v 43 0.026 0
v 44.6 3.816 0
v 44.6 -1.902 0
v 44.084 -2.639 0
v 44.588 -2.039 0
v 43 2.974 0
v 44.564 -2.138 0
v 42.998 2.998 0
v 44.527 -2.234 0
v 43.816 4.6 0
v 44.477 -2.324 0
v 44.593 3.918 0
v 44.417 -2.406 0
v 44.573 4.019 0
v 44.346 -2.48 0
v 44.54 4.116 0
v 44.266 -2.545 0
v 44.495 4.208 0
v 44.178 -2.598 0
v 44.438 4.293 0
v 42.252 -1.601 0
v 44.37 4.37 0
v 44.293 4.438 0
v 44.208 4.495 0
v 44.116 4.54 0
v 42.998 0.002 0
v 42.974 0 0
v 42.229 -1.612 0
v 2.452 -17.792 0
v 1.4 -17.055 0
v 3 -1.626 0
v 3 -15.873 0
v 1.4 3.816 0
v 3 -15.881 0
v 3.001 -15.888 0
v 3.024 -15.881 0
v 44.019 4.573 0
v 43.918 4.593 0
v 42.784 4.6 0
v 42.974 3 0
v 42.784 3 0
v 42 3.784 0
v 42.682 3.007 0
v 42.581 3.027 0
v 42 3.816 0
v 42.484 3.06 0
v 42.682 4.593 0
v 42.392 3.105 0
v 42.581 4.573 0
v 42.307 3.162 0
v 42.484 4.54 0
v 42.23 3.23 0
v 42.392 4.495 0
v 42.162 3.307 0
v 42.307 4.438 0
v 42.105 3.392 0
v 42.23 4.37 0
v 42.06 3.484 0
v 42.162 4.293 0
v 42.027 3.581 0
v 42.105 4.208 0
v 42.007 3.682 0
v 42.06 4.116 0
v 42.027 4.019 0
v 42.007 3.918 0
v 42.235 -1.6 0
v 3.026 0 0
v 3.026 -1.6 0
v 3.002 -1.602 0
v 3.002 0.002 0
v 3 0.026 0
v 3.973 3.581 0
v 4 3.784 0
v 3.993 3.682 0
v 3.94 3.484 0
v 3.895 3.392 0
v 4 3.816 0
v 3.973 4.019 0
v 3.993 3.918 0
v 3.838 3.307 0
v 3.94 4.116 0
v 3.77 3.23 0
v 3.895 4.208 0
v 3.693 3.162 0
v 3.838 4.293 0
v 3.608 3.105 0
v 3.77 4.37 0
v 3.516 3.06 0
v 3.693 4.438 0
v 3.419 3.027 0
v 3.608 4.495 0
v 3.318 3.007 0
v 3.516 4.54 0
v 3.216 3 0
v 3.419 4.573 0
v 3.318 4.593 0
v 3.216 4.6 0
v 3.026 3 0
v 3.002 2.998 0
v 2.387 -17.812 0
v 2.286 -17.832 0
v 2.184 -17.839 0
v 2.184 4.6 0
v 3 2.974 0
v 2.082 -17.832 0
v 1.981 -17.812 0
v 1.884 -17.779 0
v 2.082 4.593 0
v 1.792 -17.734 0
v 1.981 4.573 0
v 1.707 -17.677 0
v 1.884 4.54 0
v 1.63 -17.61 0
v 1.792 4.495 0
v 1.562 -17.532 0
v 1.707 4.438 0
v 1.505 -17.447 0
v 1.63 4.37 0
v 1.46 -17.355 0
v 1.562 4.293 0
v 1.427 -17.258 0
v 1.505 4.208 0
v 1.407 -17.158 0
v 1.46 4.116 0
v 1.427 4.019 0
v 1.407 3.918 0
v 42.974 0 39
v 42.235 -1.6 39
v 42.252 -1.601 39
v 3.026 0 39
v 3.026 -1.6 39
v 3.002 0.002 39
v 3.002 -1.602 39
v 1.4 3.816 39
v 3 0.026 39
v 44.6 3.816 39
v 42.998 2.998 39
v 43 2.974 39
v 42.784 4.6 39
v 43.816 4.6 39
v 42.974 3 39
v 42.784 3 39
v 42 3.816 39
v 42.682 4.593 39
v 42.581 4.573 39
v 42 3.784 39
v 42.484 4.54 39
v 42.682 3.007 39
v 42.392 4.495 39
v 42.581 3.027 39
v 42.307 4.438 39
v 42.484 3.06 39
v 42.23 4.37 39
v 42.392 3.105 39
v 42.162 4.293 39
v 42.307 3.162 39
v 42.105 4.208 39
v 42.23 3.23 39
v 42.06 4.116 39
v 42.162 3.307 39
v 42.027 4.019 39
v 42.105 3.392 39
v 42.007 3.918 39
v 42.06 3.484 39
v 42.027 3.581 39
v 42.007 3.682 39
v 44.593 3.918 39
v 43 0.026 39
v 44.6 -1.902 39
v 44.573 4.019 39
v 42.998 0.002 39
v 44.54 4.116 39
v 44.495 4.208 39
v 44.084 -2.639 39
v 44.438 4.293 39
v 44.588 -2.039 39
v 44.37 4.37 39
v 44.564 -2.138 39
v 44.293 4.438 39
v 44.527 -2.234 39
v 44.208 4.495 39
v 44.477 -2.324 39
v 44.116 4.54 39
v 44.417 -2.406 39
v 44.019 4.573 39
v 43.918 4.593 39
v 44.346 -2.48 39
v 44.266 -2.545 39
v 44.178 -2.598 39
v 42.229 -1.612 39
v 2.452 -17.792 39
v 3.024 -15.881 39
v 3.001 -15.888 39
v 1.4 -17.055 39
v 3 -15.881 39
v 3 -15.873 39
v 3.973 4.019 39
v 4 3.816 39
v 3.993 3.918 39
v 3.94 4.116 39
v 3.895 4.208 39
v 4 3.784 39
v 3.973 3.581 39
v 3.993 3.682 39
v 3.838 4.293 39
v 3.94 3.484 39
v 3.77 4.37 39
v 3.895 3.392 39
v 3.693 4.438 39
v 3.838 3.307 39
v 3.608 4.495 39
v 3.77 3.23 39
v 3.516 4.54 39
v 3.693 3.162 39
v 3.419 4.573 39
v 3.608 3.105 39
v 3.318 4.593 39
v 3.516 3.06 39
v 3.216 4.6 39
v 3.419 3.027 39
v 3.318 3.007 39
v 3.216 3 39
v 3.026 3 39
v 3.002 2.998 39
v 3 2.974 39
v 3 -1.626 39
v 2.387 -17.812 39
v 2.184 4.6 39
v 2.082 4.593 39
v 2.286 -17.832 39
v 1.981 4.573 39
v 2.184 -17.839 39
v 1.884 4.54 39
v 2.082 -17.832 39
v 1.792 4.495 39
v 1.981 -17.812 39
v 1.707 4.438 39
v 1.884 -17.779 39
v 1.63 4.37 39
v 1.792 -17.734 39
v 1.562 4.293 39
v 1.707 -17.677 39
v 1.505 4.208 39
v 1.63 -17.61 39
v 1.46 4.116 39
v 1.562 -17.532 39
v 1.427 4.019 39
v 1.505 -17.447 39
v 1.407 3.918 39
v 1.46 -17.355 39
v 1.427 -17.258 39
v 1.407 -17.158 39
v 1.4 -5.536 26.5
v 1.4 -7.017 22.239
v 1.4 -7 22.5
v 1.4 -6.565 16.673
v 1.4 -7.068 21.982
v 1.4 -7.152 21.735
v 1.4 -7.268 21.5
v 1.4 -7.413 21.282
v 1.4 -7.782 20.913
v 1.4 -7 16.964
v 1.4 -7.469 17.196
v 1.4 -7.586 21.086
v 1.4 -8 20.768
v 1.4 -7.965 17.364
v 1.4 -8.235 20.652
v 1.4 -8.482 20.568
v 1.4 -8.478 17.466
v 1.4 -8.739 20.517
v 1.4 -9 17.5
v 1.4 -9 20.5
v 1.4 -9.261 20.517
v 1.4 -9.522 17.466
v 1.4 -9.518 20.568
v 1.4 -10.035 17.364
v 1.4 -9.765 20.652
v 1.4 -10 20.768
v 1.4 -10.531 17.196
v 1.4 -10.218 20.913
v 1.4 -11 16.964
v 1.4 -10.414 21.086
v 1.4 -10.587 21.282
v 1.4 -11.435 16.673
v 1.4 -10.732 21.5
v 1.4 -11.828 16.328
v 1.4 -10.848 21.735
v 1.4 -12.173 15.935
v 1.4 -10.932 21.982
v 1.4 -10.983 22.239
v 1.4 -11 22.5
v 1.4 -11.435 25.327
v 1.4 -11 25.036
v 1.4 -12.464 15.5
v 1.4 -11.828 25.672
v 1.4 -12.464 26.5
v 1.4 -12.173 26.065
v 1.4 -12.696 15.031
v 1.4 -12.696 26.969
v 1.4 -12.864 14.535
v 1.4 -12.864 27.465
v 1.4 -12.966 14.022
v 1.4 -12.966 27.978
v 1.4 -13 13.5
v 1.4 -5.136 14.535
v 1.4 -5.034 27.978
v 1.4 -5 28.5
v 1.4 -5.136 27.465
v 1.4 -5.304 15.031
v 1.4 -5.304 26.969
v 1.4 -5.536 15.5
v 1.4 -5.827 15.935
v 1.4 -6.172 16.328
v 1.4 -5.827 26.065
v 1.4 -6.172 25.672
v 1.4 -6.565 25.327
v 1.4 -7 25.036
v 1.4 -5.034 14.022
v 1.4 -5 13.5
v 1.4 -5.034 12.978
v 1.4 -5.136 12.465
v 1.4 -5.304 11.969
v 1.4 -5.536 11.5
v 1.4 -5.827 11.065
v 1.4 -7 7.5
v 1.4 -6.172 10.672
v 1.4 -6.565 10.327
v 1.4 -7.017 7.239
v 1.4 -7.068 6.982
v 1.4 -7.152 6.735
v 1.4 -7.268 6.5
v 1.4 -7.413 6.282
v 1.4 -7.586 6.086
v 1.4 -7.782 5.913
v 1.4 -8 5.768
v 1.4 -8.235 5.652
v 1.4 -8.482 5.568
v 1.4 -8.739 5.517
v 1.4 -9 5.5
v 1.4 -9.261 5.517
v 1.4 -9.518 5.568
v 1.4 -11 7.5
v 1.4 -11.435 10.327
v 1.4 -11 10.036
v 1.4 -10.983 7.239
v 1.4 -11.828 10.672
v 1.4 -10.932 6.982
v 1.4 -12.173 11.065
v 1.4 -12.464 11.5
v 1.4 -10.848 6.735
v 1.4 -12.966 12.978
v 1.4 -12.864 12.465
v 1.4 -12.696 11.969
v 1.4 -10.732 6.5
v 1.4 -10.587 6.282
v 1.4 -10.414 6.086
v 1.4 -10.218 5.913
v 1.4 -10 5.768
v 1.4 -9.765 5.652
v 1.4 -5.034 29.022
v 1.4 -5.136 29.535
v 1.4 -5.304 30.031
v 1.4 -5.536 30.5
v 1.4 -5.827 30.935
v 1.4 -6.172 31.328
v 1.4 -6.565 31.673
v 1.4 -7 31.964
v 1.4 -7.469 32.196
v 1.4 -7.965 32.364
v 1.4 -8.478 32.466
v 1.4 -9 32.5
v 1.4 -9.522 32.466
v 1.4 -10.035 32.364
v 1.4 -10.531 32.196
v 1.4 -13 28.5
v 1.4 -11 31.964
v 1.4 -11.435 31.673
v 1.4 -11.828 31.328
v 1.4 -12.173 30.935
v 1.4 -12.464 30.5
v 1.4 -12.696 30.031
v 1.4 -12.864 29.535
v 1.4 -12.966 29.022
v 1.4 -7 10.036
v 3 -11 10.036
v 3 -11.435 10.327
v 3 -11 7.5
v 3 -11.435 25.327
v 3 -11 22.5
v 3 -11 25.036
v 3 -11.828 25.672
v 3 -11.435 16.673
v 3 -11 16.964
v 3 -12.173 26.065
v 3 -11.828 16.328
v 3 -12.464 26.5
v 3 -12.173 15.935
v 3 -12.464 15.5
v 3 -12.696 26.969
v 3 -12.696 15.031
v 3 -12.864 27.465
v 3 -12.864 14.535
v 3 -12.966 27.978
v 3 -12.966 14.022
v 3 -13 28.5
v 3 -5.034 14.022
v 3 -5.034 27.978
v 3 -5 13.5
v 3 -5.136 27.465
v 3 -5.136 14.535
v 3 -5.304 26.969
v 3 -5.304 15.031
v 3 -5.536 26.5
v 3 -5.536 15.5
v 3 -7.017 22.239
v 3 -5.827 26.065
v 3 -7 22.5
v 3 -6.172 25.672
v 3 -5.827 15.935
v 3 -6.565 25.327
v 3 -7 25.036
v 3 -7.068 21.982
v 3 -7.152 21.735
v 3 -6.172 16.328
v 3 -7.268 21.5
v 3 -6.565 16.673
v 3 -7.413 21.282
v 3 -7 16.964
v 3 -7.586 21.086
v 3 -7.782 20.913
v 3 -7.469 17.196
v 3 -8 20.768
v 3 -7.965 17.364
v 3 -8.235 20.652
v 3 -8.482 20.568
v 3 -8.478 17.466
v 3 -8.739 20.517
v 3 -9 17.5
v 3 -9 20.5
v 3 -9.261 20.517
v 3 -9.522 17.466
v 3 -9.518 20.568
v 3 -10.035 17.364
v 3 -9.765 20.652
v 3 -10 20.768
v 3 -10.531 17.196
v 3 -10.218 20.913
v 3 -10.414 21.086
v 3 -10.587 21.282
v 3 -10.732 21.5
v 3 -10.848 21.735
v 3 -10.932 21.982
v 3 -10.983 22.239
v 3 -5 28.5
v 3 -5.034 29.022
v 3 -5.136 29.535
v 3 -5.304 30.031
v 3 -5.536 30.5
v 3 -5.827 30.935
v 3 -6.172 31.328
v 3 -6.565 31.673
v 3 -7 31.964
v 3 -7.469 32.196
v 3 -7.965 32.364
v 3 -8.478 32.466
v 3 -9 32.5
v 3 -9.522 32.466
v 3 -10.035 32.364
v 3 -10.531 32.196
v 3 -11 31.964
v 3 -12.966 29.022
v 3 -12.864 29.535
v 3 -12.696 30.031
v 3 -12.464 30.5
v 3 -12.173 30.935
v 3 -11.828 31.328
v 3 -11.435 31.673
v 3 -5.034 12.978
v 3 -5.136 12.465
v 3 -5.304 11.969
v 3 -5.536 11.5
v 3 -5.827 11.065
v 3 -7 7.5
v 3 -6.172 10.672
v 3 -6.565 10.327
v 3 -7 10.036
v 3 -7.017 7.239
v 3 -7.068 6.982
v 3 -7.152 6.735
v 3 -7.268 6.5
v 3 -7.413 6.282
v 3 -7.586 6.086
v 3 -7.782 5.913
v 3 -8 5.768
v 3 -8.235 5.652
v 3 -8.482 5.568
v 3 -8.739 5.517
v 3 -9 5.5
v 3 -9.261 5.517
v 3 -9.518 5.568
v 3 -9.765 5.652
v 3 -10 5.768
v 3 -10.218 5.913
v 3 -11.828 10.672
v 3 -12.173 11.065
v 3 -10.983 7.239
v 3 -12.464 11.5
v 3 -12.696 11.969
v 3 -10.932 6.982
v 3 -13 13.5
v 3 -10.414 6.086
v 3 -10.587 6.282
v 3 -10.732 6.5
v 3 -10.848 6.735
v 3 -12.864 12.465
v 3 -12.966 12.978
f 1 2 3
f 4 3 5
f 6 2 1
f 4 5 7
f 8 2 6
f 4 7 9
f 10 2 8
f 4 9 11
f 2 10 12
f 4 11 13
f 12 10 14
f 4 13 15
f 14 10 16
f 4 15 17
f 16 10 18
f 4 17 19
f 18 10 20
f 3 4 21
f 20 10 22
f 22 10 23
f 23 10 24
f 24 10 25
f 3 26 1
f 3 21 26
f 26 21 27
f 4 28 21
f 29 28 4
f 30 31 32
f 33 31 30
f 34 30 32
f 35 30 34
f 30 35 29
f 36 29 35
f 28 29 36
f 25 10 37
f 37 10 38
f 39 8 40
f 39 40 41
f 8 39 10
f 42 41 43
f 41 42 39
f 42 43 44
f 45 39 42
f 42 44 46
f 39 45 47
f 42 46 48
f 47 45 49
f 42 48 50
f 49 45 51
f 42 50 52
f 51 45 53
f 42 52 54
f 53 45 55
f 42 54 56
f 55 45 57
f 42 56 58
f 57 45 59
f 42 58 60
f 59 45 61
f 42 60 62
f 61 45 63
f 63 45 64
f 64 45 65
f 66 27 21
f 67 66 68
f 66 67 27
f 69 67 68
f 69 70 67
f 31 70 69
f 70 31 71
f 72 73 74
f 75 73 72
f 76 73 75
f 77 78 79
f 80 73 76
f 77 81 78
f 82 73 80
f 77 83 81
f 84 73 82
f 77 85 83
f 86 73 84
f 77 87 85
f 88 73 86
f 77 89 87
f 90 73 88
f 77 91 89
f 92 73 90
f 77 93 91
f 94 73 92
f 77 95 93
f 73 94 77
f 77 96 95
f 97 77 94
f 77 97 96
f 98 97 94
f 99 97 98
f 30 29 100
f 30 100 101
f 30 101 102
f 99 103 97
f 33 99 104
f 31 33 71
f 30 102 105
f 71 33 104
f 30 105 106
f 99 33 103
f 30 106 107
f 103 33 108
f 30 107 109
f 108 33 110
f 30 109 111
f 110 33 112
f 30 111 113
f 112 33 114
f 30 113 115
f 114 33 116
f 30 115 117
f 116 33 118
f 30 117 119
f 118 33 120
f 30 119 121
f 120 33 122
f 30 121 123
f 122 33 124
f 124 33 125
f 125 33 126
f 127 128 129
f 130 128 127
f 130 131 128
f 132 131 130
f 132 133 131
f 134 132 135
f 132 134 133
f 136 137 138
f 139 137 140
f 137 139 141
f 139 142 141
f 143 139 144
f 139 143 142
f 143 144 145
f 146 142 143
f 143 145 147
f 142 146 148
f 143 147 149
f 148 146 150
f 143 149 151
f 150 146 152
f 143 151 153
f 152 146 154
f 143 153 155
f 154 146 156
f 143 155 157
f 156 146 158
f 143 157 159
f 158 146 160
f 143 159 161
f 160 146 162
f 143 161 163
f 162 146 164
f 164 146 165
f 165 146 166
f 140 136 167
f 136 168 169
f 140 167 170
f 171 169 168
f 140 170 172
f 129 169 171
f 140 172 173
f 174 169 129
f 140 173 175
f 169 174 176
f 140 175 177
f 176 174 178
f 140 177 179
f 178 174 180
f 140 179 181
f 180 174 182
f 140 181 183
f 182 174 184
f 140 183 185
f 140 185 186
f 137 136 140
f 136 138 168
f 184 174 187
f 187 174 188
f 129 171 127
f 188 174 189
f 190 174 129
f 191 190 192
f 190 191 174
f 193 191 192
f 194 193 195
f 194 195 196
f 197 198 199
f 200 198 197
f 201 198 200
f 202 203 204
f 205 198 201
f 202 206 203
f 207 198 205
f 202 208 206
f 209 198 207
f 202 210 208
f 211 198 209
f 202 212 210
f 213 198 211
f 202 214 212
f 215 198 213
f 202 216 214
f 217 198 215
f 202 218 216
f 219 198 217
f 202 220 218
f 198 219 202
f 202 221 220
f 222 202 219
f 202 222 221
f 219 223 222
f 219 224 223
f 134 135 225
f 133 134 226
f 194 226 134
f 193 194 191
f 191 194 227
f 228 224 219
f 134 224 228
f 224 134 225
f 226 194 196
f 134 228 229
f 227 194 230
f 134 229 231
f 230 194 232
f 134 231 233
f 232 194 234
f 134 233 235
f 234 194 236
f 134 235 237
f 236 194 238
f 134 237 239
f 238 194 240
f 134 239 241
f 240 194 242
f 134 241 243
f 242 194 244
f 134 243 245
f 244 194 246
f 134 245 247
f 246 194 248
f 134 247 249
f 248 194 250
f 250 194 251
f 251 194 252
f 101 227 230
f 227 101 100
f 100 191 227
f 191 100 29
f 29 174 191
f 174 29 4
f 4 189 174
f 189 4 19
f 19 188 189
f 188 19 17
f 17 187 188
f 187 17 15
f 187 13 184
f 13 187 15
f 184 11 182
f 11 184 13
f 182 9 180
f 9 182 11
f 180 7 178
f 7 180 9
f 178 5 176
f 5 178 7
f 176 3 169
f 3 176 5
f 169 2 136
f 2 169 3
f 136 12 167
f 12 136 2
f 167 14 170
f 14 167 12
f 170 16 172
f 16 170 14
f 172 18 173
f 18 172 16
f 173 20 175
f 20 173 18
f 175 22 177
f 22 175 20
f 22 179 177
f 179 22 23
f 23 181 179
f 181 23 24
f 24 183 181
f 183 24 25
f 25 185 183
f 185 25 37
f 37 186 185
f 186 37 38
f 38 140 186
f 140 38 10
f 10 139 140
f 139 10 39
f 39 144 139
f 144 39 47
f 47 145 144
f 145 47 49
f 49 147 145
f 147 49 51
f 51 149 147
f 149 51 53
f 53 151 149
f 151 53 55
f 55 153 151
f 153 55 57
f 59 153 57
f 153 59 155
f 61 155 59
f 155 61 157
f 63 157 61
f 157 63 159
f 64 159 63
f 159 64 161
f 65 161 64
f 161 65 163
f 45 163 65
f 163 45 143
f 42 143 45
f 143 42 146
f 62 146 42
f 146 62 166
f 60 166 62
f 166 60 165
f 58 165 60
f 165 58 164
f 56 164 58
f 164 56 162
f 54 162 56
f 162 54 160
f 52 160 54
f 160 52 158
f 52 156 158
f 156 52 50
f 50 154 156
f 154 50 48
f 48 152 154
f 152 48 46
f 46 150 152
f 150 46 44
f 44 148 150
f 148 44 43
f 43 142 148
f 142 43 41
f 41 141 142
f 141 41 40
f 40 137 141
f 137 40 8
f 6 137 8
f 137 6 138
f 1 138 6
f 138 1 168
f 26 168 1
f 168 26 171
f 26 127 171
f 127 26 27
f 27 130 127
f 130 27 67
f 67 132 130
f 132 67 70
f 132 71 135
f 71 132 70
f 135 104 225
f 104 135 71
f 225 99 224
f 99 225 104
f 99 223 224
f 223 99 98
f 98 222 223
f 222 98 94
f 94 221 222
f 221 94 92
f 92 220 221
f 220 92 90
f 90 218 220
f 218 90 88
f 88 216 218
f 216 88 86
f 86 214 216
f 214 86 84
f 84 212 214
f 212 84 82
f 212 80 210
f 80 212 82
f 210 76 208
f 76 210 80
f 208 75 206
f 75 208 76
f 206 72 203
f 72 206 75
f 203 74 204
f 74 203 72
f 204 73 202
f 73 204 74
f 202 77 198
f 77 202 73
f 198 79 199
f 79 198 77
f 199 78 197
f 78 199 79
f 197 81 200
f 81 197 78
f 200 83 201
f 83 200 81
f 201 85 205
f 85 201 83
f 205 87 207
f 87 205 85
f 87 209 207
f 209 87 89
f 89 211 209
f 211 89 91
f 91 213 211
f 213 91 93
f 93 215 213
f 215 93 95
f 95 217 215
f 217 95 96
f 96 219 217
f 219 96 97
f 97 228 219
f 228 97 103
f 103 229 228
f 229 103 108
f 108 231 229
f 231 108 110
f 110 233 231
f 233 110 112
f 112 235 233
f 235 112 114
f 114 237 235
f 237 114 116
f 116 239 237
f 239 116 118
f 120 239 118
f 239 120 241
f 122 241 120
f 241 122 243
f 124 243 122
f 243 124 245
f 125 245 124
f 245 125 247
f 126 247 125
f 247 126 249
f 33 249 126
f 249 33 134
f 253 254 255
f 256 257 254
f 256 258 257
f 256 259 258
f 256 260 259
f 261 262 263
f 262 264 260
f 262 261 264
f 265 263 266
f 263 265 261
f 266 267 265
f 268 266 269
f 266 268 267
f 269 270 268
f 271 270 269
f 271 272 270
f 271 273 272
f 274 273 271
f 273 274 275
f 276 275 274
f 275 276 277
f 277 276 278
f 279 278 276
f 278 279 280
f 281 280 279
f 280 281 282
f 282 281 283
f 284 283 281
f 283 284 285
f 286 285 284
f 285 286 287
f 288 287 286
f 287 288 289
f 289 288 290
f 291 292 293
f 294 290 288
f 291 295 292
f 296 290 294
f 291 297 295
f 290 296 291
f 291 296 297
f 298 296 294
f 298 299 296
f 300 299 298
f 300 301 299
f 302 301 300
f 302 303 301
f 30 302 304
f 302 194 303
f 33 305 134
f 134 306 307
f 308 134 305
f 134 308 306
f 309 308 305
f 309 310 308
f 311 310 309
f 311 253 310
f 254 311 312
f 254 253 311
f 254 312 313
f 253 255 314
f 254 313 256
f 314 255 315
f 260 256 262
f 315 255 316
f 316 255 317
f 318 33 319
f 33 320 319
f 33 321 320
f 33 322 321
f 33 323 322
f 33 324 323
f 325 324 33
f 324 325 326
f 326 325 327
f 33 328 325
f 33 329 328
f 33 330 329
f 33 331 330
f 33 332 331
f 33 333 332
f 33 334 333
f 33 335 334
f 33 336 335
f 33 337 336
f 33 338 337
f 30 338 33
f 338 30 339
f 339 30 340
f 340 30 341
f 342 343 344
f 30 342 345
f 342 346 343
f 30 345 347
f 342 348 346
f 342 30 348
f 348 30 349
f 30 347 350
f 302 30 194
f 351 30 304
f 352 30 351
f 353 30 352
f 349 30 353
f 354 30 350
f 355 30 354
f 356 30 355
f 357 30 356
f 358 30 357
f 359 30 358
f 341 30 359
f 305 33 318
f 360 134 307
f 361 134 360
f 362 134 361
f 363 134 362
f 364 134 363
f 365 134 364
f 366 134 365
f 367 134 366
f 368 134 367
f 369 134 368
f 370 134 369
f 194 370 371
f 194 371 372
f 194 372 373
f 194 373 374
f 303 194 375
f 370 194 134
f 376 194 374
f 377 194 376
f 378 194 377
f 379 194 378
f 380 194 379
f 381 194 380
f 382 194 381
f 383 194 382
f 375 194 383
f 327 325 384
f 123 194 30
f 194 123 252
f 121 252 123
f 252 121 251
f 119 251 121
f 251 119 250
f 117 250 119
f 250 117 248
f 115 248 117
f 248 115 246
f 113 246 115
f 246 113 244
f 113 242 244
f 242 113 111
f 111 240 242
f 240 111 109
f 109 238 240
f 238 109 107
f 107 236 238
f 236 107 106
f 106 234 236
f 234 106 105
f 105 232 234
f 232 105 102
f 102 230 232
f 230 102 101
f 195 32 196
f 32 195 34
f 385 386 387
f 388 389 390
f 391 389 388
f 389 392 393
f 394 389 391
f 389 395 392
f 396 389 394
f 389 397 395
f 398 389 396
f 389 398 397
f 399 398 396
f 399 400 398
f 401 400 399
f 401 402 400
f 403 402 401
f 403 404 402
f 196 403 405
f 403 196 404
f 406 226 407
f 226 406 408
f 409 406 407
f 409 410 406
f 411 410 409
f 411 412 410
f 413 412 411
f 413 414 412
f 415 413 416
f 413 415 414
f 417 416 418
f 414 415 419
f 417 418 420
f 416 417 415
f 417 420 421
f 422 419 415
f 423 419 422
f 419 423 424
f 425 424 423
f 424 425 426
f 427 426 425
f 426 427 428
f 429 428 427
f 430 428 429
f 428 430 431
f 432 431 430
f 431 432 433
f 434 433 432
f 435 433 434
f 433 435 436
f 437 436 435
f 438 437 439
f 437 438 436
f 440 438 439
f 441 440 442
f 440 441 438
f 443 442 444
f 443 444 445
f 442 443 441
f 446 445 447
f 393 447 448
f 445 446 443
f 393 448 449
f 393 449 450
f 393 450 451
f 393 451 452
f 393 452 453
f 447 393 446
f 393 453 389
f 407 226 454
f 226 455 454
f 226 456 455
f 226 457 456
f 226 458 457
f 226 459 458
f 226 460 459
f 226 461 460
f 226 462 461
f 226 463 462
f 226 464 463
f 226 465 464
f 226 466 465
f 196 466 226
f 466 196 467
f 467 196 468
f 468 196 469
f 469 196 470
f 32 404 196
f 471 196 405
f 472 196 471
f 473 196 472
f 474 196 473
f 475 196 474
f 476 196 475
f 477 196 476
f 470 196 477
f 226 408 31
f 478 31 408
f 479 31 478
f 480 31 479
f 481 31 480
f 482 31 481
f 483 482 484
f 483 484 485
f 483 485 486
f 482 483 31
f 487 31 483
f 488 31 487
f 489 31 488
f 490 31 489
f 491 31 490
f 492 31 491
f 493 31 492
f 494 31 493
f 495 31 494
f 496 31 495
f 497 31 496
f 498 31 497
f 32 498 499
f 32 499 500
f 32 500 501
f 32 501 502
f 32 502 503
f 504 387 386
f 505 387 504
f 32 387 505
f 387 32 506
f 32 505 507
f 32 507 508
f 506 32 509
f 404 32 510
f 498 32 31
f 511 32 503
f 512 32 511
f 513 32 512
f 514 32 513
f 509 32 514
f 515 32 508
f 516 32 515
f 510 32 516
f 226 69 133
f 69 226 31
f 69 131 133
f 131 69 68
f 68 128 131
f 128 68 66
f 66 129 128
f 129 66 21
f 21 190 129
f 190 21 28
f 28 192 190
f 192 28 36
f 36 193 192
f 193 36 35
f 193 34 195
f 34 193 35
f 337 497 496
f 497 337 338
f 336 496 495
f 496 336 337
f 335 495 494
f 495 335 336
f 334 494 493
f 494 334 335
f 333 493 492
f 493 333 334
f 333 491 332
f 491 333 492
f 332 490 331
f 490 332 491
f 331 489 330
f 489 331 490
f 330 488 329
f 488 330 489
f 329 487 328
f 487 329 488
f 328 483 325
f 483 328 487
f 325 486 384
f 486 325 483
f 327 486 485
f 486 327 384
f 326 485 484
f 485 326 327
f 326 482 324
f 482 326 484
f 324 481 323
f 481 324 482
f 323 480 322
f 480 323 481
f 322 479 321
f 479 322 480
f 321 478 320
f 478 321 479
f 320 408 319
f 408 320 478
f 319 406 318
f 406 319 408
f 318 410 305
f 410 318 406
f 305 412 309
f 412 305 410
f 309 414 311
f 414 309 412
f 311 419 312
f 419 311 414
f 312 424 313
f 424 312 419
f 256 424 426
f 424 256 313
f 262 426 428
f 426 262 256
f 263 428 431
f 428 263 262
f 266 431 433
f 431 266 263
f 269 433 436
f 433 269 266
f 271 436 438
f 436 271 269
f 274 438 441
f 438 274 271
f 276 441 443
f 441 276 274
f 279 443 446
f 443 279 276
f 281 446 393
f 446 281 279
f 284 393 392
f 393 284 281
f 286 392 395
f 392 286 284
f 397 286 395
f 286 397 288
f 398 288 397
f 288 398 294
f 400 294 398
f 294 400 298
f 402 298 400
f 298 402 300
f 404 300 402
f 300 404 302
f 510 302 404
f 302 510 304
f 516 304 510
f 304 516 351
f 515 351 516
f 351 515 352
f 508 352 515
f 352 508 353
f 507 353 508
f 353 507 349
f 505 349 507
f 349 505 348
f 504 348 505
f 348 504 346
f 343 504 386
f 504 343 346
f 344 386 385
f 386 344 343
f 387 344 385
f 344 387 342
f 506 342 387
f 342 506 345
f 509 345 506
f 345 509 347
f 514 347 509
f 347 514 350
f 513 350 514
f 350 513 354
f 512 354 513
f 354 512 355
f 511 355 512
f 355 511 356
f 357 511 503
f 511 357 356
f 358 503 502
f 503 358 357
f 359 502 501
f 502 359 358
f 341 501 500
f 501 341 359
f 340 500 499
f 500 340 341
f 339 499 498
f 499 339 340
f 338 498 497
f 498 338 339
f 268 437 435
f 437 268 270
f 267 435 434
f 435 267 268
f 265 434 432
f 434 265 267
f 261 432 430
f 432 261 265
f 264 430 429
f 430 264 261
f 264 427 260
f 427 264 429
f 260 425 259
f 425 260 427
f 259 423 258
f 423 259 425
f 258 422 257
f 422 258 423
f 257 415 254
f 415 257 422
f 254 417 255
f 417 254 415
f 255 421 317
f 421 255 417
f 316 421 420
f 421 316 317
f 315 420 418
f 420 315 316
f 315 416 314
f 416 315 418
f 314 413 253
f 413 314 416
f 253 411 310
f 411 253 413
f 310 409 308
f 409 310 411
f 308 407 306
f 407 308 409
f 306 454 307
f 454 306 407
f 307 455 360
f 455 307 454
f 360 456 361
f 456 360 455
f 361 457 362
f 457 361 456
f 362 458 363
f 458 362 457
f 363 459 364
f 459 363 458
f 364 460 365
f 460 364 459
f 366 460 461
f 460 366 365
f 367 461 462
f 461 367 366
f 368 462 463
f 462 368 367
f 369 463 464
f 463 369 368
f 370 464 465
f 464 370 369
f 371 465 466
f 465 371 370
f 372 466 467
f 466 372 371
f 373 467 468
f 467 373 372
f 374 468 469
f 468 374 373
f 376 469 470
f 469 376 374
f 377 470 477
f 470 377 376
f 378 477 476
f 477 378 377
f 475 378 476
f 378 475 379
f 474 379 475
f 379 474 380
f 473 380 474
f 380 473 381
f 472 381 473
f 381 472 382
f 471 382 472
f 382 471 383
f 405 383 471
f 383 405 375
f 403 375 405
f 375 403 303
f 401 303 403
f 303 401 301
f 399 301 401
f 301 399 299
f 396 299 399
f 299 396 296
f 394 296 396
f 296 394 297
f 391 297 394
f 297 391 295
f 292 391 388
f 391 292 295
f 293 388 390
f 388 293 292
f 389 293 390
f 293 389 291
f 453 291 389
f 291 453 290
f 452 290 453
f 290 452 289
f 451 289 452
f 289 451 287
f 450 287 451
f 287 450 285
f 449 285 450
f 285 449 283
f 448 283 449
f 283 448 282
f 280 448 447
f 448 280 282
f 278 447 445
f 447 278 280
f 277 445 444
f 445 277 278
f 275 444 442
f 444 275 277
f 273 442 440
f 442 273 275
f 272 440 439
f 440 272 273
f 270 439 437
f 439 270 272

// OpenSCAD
// Parameters

case_tilt = 30;

hole_r_1 = 4;
hole_r_2 = 2;

// Dimensions

N = 0.4; // Nozzle diameter
L = N / 2; // Layer height
E = 0.01;
NEAR = 50;
FAR = 300;

dim_case = [61, 90, 22];

dim_printer_base = [FAR, FAR, NEAR];
dim_printer_frame = [40, 3, FAR];
dim_printer_bracket = [40, NEAR, 13];

offset_printer_frame = 3;
offset_printer_bracket = 40;

mount_thickness = N * 4;

// Modules

module case() {
    color("#aaaaff55")
    rotate([case_tilt, 0, 0])
        cube(dim_case, center = true);
}

module printer() {
    module base() {
        cube(dim_printer_base);
    }

    module frame() {
        cube(dim_printer_frame);
    }

    module bracket() {
        cube(dim_printer_bracket);
    }

    color("#aaaaaacc") {
        translate([0, - dim_printer_base.y / 2, - dim_printer_base.z])
            base();

        translate([offset_printer_frame, 0, 0])
            frame();

        translate([offset_printer_frame, dim_printer_frame.y, offset_printer_bracket])
            bracket();
    }
}

module frame_mount() {
    $fn = 48;

    snap_width = dim_printer_frame.x + mount_thickness * 2;
    snap_depth = dim_printer_frame.y + mount_thickness * 2;
    snap_grip = 1;

    module snap_section() {
        offset(mount_thickness * 0.49)
        offset(- mount_thickness * 0.49) {
            difference() {
                square([snap_width, snap_depth], center = true);
                square([dim_printer_frame.x, dim_printer_frame.y], center = true);
                translate([0, mount_thickness])
                    square([dim_printer_frame.x - snap_grip * 2, dim_printer_frame.y + mount_thickness], center = true);
            }

            triangle_angle = 20;
            triangle_extent = snap_width * tan(triangle_angle);
            triangle_diagonal = snap_width / cos(triangle_angle);

            translate([(mount_thickness - snap_width) / 2, - (triangle_extent + snap_depth) / 2 + E])
                square([mount_thickness, triangle_extent], center = true);

            intersection() {
                translate([0, - (triangle_extent + snap_depth) / 2])
                rotate(90 + triangle_angle)
                    square([mount_thickness, triangle_diagonal], center = true);

                // Cut off the bits that stick out
                square([snap_width, 10 ^ 3], center = true);
            }
        }
    }

    module snap() {
        translate([
            offset_printer_frame + dim_printer_frame.x / 2,
            dim_printer_frame.y / 2,
            0,
        ])
        linear_extrude(offset_printer_bracket - 1, convexity = 4)
            snap_section();
    }

    module slot_section() {
        circle(hole_r_2);

        translate([0, hole_r_2 * 3])
            circle(hole_r_1);

        translate([0, hole_r_2 * 1.5])
            square([hole_r_2 * 2, hole_r_2 * 3], center = true);
    }

    module slot() {
        rotate([90, 0, 90])
        linear_extrude(mount_thickness * 2, center = true, convexity = 4)
            slot_section();
    }

    difference() {
        snap();

        oy = 9;
        oz = 7.5;
        dz = 15;

        #translate([mount_thickness, - oy, oz])
            slot();

        #translate([mount_thickness, - oy, oz + dz])
            slot();
    }
}

module assembly() {
    %printer();

    translate([- dim_case.x / 2, 0, 0])
        %case();

    frame_mount();
}

assembly();
